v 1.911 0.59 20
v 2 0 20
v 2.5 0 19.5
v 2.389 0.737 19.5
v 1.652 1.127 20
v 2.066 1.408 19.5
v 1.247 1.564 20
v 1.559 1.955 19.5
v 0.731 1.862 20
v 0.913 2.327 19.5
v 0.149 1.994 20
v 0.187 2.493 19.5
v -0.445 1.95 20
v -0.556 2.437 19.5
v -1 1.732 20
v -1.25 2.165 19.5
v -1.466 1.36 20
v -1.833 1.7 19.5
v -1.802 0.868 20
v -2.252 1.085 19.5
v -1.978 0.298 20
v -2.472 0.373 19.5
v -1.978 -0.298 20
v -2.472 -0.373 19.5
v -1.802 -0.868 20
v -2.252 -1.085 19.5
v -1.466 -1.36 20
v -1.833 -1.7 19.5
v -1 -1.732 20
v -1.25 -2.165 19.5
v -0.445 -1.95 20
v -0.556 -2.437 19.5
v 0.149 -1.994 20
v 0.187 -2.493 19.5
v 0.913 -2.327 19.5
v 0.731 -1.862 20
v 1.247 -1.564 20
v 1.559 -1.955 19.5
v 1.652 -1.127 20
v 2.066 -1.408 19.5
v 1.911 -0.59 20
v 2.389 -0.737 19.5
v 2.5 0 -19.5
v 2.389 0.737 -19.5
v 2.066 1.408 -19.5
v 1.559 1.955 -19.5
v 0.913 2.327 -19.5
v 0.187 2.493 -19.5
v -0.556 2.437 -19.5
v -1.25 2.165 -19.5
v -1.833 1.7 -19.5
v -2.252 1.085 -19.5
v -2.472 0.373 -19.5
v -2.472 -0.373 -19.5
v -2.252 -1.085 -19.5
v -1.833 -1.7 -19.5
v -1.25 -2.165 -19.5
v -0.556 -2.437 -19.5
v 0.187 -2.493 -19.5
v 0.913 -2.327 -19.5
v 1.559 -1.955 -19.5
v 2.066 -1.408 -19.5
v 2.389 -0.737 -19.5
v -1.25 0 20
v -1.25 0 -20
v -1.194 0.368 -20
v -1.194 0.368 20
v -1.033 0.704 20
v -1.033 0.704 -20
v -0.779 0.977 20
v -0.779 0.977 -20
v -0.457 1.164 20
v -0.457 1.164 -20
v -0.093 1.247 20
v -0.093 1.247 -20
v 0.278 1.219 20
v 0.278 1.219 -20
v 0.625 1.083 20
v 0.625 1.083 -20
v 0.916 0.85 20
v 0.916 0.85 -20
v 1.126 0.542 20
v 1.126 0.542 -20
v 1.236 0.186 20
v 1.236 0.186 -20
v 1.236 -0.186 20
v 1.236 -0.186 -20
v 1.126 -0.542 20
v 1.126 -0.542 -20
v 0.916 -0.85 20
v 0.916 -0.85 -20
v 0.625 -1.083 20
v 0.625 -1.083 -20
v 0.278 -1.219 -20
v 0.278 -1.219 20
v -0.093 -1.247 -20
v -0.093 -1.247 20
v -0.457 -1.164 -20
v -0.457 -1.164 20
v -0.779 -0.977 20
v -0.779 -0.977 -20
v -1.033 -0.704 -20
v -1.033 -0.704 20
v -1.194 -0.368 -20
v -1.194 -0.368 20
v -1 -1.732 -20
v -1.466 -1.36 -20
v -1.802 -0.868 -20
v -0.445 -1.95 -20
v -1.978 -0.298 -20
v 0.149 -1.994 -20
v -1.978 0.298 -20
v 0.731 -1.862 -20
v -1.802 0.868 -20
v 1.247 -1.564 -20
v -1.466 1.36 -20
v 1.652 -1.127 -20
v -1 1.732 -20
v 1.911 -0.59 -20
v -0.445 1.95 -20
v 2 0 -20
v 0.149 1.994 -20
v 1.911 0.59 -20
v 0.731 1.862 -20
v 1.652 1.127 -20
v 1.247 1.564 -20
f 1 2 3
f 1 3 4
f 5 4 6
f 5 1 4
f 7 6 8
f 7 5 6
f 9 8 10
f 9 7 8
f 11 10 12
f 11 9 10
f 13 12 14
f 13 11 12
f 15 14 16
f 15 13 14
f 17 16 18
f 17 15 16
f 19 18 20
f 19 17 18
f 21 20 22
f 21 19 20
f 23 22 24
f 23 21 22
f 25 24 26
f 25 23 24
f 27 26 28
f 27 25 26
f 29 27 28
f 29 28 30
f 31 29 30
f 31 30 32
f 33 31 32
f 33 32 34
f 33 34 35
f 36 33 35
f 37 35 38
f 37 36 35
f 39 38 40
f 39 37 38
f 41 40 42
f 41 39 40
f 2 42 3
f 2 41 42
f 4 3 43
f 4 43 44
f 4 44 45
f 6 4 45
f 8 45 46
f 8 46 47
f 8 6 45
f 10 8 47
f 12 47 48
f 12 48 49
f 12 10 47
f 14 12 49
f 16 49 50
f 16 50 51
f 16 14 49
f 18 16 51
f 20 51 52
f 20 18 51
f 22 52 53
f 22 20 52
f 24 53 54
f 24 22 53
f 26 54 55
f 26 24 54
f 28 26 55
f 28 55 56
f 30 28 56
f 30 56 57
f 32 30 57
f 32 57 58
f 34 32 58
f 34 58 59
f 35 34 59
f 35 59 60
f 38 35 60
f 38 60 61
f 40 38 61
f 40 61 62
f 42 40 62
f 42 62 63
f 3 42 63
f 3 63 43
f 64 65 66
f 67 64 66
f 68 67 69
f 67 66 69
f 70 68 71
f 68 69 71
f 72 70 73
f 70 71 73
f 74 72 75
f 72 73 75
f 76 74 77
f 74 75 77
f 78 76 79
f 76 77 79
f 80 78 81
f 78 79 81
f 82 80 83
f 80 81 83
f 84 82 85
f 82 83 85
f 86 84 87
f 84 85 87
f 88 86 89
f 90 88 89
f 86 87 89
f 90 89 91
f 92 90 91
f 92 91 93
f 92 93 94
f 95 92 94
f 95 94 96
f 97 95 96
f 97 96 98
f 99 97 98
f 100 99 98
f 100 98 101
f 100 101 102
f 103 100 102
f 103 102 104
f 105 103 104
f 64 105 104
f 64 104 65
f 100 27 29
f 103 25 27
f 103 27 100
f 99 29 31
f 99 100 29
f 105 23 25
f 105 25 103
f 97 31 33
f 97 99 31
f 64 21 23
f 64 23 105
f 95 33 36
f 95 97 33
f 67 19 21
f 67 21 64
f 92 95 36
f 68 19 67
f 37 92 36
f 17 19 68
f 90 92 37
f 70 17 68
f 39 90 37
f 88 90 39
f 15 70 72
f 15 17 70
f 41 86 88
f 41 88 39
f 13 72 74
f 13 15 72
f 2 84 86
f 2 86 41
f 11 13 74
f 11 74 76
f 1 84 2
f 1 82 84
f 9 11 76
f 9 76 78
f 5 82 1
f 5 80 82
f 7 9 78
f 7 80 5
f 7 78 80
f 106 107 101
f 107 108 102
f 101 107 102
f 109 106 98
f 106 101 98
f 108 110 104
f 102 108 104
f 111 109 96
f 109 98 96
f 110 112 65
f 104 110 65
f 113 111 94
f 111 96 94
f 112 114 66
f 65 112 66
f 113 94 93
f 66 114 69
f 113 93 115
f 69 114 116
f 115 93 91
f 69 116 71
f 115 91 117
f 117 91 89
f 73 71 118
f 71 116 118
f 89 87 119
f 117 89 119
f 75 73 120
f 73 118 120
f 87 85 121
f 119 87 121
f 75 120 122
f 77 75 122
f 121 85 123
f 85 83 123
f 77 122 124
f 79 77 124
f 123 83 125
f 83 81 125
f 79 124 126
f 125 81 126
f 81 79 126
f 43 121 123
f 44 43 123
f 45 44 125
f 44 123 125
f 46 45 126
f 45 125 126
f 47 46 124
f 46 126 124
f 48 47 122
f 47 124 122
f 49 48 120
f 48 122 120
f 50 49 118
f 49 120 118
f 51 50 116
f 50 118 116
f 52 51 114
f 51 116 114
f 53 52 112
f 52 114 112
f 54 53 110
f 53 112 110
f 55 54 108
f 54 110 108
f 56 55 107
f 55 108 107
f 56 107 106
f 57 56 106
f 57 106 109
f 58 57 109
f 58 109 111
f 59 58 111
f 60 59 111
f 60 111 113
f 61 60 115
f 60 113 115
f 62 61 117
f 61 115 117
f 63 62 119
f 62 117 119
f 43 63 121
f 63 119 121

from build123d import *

# Parameters (mm, degrees)
SKETCH1_R             = 2.5
BOSS_EXTRUDE1_DEPTH   = 20
M3X0_5_TAPPED_HOLE1_D = 2.5
CHAMFER1_SIZE         = 0.5


with BuildPart() as part:
    # Sketch1 → Boss-Extrude1 (new, symmetric)
    with BuildSketch(Plane.XY):
        Circle(SKETCH1_R)
    extrude(amount=BOSS_EXTRUDE1_DEPTH, both=True)

    # M3x0.5 Tapped Hole1 (through all)
    with Locations(Plane.XY.offset(20)):
        with Locations((0, 0)):
            Hole(M3X0_5_TAPPED_HOLE1_D / 2)

    # Chamfer1
    chamfer1_edges = [part.edges().sort_by_distance(p)[0] for p in [
        (-2.5, 0, -20),
        (-2.5, 0, 20),
    ]]
    chamfer(chamfer1_edges, length=CHAMFER1_SIZE)


solid = part.part
